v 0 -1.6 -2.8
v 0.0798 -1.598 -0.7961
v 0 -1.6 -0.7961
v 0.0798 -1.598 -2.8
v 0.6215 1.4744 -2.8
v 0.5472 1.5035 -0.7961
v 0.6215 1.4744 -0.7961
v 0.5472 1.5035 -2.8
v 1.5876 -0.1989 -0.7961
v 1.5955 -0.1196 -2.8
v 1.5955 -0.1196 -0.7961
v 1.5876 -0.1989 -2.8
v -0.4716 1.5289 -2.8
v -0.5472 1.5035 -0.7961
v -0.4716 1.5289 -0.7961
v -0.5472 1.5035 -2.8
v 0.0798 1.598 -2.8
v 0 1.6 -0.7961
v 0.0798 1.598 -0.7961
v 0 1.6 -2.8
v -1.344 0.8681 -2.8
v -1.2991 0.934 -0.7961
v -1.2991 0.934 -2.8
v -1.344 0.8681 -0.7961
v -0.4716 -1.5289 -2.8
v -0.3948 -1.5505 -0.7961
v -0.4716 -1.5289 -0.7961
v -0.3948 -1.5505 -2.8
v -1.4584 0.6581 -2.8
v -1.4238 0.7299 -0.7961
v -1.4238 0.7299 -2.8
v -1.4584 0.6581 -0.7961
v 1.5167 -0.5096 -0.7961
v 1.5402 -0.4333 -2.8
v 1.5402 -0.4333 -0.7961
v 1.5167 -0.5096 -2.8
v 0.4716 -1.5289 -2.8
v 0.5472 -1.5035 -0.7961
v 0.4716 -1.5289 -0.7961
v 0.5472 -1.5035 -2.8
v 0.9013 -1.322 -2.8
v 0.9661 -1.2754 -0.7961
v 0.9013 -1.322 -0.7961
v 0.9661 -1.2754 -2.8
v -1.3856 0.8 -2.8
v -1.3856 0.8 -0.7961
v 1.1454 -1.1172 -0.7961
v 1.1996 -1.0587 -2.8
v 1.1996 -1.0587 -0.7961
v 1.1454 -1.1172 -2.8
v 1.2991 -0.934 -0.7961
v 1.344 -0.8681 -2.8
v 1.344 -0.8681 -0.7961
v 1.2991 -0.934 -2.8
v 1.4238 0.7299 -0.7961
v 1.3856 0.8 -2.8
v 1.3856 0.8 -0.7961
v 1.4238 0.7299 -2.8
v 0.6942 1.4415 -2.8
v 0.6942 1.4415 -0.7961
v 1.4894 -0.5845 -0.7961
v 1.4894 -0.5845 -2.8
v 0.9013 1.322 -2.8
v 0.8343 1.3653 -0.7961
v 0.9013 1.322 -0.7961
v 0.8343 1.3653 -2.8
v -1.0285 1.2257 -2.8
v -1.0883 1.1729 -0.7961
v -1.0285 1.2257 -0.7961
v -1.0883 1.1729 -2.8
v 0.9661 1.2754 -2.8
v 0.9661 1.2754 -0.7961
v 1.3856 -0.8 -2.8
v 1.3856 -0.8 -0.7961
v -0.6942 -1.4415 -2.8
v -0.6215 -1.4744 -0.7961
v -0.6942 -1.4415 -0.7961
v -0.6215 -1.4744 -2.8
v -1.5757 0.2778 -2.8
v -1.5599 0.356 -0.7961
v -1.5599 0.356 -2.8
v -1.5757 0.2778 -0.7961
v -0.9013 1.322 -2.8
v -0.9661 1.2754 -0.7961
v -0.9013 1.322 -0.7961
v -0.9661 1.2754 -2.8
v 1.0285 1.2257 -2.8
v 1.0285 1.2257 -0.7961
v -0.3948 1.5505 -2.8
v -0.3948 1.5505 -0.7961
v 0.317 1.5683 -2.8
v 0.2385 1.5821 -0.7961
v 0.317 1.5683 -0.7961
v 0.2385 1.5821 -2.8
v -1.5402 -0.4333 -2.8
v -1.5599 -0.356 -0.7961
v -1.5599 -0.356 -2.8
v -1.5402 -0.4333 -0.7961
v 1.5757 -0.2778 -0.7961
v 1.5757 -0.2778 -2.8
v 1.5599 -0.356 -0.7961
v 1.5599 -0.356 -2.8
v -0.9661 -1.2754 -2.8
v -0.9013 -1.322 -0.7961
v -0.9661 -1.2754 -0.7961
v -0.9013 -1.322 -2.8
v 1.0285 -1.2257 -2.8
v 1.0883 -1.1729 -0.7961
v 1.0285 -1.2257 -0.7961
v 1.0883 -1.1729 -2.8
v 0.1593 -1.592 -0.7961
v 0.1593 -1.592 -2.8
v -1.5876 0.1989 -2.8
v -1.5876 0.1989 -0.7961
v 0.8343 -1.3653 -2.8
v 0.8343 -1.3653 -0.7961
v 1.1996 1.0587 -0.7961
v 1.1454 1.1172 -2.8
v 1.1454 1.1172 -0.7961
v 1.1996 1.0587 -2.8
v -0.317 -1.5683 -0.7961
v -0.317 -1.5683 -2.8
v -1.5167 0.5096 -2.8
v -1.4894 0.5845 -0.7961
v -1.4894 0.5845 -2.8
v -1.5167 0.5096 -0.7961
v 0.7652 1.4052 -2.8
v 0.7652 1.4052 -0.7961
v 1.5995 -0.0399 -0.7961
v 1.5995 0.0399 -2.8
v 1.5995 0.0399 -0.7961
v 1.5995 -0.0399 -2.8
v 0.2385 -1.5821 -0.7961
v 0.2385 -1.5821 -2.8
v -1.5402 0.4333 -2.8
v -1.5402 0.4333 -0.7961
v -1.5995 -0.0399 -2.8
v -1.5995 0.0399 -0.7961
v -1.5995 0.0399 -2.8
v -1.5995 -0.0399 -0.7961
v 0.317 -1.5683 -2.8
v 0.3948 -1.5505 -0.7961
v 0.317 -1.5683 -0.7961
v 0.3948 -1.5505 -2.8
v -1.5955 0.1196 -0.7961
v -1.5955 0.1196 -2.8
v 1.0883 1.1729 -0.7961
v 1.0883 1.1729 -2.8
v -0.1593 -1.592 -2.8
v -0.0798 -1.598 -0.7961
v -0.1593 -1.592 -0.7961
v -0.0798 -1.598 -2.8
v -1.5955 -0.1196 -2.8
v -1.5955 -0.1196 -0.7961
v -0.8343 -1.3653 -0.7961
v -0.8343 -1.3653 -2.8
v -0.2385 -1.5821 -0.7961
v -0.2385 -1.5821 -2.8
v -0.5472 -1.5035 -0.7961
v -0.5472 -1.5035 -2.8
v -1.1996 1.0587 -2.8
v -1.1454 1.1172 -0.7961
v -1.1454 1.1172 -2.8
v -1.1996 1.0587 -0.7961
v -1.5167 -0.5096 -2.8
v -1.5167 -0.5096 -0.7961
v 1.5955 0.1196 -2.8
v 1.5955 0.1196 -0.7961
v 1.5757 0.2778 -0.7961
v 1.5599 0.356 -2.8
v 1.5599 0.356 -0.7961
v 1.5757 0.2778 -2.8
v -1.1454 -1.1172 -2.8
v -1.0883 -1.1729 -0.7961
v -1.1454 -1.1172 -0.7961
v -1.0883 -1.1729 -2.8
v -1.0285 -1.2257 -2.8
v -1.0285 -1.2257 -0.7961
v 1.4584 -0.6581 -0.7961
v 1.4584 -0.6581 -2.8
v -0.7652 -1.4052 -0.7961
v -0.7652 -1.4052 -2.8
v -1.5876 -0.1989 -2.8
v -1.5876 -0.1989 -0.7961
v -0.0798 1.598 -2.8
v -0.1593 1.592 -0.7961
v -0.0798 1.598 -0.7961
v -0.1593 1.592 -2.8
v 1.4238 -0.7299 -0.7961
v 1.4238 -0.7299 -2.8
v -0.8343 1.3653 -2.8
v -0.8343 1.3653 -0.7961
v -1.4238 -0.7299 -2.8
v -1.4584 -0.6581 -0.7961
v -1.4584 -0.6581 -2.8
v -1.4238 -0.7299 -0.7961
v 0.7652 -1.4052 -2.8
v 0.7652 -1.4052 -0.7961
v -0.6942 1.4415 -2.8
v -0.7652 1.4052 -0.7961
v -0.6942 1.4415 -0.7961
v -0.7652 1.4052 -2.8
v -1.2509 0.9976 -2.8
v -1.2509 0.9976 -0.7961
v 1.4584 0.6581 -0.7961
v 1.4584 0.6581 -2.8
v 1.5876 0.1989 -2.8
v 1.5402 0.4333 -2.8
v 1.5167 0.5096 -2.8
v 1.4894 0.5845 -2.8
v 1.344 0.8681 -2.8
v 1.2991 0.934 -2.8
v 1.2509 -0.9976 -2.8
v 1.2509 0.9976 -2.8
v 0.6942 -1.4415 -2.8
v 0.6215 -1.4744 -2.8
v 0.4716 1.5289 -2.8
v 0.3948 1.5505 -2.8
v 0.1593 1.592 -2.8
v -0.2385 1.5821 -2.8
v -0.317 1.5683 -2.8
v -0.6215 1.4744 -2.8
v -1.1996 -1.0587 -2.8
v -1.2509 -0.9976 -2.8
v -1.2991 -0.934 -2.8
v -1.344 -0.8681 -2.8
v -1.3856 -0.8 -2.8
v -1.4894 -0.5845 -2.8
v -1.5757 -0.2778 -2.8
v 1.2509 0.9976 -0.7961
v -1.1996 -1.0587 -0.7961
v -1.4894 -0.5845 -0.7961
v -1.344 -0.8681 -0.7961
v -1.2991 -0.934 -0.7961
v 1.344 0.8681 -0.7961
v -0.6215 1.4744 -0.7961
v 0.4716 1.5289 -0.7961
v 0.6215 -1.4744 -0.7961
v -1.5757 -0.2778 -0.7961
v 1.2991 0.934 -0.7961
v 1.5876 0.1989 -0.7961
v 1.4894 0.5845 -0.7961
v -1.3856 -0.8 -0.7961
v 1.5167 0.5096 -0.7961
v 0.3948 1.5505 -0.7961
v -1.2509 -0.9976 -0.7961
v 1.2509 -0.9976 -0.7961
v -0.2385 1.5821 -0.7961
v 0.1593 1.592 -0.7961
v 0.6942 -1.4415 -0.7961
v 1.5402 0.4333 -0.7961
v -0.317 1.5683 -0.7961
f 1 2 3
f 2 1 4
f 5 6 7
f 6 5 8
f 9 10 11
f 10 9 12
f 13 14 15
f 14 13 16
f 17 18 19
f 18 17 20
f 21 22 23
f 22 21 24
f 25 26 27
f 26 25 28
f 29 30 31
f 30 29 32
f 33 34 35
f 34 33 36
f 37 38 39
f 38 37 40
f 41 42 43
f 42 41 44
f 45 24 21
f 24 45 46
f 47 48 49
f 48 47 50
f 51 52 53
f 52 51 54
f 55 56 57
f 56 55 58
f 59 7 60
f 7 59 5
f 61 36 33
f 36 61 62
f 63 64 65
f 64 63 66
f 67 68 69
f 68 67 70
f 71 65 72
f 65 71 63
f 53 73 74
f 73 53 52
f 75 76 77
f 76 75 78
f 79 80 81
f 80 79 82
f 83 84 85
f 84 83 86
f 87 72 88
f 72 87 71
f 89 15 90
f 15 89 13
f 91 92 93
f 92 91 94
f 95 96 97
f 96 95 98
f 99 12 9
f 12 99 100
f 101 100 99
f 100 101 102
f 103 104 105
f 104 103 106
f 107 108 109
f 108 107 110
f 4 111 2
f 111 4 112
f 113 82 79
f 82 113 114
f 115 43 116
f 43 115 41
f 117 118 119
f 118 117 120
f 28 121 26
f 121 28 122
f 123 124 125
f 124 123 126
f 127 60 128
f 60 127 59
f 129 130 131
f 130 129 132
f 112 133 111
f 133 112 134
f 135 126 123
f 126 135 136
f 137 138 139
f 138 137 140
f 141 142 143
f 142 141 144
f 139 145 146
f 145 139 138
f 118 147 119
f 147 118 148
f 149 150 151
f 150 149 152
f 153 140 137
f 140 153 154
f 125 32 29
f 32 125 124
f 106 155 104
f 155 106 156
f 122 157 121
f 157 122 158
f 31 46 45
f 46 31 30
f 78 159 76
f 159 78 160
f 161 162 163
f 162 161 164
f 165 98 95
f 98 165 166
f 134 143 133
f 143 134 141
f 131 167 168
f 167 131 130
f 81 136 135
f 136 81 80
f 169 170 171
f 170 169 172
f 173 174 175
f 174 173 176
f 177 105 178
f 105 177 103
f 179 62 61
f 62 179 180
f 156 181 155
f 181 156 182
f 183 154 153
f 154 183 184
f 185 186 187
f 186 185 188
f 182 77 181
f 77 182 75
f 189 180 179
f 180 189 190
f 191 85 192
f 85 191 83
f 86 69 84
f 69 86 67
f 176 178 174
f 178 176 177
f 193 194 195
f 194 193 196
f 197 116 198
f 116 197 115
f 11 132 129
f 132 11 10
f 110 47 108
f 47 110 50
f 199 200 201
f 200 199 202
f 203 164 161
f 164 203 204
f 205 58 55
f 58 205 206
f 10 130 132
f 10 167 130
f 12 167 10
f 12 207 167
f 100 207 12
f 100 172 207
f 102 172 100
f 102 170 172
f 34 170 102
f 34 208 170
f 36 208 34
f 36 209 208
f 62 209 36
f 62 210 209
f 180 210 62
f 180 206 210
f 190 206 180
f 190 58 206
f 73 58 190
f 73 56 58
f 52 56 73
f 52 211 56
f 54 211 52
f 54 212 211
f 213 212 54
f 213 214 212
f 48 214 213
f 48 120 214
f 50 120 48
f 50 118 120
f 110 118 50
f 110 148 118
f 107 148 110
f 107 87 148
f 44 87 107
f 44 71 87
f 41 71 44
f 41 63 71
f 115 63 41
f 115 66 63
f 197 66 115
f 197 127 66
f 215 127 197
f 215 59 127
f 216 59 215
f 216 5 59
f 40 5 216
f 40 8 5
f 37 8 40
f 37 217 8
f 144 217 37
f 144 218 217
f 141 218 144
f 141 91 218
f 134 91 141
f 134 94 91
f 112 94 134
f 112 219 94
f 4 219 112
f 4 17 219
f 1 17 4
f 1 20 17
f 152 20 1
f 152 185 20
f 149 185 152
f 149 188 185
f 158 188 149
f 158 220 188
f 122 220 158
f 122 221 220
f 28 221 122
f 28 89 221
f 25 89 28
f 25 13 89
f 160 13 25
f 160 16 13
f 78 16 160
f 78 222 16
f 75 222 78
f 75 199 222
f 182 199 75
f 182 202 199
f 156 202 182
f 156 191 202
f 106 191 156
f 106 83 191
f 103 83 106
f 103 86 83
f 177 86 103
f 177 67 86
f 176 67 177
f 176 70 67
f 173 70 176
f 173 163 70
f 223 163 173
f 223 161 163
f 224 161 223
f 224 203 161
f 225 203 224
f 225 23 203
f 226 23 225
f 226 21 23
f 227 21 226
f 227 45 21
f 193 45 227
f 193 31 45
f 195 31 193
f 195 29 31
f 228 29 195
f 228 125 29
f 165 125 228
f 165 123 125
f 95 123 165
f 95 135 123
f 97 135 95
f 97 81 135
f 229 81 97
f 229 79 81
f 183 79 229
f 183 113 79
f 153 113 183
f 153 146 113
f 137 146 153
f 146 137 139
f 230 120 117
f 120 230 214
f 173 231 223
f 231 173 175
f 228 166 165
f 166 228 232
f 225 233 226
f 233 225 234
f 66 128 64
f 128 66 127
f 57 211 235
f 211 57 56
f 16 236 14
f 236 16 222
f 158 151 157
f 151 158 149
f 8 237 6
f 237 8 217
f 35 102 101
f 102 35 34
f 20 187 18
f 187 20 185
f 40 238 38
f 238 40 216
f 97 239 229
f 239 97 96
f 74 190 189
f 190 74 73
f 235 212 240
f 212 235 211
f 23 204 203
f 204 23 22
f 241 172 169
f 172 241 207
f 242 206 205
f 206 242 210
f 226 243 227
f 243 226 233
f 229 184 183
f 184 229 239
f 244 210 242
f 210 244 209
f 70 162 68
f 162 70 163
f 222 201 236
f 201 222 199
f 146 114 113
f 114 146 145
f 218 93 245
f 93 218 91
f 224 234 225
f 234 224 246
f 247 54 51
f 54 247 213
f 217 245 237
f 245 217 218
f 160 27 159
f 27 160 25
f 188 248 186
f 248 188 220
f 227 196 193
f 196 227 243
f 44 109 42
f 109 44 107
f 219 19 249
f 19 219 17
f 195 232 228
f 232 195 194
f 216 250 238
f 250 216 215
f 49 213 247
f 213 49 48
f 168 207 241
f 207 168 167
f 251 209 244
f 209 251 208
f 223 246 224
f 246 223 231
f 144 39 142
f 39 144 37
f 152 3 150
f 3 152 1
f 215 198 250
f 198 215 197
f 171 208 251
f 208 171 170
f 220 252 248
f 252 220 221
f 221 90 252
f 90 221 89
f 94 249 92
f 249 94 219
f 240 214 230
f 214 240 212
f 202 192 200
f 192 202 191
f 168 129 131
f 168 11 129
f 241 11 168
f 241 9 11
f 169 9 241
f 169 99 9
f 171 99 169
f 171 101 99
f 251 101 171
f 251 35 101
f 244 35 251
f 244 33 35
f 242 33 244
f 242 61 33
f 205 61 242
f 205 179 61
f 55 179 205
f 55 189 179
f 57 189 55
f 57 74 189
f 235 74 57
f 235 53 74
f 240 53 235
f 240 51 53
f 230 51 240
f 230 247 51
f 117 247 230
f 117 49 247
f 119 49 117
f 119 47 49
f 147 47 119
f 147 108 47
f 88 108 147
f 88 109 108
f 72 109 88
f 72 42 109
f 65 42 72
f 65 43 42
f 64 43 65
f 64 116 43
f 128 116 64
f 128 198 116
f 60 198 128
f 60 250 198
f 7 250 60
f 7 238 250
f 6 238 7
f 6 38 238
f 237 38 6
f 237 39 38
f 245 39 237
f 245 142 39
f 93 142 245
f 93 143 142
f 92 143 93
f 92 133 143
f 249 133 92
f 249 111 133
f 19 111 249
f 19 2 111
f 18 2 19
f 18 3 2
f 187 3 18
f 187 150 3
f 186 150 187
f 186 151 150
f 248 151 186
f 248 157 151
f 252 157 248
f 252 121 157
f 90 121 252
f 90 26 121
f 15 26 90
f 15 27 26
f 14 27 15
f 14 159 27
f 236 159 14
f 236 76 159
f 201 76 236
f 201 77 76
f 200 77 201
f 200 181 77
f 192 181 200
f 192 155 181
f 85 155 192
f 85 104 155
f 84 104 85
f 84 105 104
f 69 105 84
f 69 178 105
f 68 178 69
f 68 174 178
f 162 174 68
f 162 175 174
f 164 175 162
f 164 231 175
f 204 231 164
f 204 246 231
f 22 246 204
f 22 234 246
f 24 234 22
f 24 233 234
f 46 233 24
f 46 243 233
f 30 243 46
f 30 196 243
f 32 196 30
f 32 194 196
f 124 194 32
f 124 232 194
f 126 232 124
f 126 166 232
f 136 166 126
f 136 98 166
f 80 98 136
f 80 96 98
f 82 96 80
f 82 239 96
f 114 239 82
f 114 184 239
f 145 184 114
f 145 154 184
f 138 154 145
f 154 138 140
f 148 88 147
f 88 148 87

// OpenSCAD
use <../../lib.scad>
use <3351as02.scad>
$fa=1; $fs=0.2;
function ldraw_lib__s__647s00(realsolid=false) = [
// 0 ~Moved to s\3351as02
// 0 Name: s\647s00.dat
// 0 Author: [PTadmin]
// 0 !LDRAW_ORG Subpart UPDATE 2010-02
// 0 !LICENSE Licensed under CC BY 4.0 : see CAreadme.txt
// 
// 0 BFC CERTIFY CCW
  [0,"BFC","CERTIFY"],
  [0,"BFC","CCW"],
// 
// 0 !HISTORY 2010-07-05 [PTadmin] Official Update 2010-02
// 
// 
// 0 // ~Roadsign Straight - Post
// 
// 1 16 0 0 0 1 0 0 0 1 0 0 0 1 s\3351as02.dat
  [1,16,0,0,0,1,0,0,0,1,0,0,0,1, ldraw_lib__s__3351as02(realsolid)],
// 0
];
module ldraw_lib__s__647s00(step=0, col=false, unit=2/5, alt=false, line=0.2, solid=!$preview)
    makepoly(ldraw_lib__s__647s00(solid), step=step, col=col, unit=unit, alt=alt, line=line, solid=solid);
ldraw_lib__s__647s00(line=0.2);
